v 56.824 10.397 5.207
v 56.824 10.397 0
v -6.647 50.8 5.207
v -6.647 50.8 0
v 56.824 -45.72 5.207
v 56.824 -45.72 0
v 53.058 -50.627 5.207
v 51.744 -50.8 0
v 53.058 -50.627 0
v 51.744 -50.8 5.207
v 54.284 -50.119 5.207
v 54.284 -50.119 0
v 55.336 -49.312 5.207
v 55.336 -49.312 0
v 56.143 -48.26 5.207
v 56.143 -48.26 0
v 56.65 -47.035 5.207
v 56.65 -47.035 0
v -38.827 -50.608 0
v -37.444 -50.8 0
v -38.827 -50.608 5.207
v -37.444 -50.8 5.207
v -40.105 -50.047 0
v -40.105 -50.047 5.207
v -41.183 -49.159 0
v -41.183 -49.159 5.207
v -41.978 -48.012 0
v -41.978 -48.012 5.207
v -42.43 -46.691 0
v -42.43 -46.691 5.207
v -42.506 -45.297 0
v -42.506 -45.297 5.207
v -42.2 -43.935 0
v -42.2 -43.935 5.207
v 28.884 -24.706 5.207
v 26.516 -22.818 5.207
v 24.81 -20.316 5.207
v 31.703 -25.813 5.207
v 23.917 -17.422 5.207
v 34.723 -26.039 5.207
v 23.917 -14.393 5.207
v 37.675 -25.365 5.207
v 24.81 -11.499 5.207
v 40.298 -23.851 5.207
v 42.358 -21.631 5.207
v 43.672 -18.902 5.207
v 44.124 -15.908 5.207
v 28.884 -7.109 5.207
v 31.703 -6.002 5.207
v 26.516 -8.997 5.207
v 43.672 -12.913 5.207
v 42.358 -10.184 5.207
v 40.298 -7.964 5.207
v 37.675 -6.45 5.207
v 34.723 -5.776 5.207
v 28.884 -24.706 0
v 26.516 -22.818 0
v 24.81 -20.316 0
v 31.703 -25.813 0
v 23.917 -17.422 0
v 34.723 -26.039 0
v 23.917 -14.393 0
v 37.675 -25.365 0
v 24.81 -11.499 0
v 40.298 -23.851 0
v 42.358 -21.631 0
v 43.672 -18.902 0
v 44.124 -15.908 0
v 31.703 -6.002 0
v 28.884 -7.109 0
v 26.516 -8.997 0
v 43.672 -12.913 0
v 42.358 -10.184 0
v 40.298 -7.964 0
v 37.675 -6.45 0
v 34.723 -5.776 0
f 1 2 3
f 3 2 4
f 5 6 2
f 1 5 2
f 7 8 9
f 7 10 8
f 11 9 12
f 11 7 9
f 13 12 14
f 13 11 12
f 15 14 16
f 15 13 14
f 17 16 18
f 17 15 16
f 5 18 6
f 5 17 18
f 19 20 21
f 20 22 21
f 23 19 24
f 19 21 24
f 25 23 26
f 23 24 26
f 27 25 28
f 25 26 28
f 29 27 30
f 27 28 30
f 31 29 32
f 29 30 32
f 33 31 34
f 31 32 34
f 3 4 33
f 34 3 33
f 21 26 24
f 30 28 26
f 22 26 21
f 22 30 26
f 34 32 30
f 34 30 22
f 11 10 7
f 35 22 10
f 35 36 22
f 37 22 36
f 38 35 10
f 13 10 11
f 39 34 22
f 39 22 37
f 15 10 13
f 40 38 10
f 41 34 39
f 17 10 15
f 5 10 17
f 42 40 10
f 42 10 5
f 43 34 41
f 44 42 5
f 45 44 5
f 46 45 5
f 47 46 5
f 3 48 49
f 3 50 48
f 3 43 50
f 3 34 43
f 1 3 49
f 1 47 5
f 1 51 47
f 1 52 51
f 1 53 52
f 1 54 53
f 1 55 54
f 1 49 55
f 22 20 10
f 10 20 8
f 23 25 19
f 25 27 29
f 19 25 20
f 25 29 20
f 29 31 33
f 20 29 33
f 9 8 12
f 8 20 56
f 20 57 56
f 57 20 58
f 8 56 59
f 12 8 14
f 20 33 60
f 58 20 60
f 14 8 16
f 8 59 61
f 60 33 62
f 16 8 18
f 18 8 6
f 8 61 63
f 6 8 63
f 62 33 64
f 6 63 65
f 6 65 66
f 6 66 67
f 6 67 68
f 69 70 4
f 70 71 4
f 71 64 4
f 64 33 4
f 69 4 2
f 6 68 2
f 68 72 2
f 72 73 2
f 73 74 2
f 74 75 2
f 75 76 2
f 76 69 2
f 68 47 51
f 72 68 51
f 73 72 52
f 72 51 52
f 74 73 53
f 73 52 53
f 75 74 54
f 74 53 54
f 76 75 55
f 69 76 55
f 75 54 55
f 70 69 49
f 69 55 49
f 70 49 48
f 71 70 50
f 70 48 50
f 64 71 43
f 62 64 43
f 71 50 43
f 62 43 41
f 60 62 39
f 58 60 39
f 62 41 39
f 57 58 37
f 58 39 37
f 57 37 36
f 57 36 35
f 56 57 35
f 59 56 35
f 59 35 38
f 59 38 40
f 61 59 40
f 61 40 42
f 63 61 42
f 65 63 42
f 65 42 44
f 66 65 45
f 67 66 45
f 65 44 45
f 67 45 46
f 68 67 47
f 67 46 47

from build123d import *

# Parameters (mm, degrees)
F1_DEPTH = 5.207
F2_R     = 10.16
F3_DEPTH = 5.207
F4_R     = 5.08


with BuildPart() as f1:
    # F0 (on Top) → F1 (new body)
    with BuildSketch(Plane.XY):
        Polygon((-44.776442, -50.8), (56.823558, -50.8), (56.823558, 10.39734), (-6.647165, 50.8), align=None)
    extrude(amount=F1_DEPTH)

    # F2 (on face) → F3 (cut, through all)
    with BuildSketch(Plane.XY.offset(5.207)):
        with Locations((33.963558, -15.907511)):
            Circle(F2_R)
    extrude(amount=-F3_DEPTH, mode=Mode.SUBTRACT)

    # F4
    f4_edges = [f1.edges().sort_by_distance(p)[0] for p in [
        (56.823558, -50.8, 2.6035),
        (-44.776442, -50.8, 2.6035),
    ]]
    fillet(f4_edges, radius=F4_R)


solid = f1.part
